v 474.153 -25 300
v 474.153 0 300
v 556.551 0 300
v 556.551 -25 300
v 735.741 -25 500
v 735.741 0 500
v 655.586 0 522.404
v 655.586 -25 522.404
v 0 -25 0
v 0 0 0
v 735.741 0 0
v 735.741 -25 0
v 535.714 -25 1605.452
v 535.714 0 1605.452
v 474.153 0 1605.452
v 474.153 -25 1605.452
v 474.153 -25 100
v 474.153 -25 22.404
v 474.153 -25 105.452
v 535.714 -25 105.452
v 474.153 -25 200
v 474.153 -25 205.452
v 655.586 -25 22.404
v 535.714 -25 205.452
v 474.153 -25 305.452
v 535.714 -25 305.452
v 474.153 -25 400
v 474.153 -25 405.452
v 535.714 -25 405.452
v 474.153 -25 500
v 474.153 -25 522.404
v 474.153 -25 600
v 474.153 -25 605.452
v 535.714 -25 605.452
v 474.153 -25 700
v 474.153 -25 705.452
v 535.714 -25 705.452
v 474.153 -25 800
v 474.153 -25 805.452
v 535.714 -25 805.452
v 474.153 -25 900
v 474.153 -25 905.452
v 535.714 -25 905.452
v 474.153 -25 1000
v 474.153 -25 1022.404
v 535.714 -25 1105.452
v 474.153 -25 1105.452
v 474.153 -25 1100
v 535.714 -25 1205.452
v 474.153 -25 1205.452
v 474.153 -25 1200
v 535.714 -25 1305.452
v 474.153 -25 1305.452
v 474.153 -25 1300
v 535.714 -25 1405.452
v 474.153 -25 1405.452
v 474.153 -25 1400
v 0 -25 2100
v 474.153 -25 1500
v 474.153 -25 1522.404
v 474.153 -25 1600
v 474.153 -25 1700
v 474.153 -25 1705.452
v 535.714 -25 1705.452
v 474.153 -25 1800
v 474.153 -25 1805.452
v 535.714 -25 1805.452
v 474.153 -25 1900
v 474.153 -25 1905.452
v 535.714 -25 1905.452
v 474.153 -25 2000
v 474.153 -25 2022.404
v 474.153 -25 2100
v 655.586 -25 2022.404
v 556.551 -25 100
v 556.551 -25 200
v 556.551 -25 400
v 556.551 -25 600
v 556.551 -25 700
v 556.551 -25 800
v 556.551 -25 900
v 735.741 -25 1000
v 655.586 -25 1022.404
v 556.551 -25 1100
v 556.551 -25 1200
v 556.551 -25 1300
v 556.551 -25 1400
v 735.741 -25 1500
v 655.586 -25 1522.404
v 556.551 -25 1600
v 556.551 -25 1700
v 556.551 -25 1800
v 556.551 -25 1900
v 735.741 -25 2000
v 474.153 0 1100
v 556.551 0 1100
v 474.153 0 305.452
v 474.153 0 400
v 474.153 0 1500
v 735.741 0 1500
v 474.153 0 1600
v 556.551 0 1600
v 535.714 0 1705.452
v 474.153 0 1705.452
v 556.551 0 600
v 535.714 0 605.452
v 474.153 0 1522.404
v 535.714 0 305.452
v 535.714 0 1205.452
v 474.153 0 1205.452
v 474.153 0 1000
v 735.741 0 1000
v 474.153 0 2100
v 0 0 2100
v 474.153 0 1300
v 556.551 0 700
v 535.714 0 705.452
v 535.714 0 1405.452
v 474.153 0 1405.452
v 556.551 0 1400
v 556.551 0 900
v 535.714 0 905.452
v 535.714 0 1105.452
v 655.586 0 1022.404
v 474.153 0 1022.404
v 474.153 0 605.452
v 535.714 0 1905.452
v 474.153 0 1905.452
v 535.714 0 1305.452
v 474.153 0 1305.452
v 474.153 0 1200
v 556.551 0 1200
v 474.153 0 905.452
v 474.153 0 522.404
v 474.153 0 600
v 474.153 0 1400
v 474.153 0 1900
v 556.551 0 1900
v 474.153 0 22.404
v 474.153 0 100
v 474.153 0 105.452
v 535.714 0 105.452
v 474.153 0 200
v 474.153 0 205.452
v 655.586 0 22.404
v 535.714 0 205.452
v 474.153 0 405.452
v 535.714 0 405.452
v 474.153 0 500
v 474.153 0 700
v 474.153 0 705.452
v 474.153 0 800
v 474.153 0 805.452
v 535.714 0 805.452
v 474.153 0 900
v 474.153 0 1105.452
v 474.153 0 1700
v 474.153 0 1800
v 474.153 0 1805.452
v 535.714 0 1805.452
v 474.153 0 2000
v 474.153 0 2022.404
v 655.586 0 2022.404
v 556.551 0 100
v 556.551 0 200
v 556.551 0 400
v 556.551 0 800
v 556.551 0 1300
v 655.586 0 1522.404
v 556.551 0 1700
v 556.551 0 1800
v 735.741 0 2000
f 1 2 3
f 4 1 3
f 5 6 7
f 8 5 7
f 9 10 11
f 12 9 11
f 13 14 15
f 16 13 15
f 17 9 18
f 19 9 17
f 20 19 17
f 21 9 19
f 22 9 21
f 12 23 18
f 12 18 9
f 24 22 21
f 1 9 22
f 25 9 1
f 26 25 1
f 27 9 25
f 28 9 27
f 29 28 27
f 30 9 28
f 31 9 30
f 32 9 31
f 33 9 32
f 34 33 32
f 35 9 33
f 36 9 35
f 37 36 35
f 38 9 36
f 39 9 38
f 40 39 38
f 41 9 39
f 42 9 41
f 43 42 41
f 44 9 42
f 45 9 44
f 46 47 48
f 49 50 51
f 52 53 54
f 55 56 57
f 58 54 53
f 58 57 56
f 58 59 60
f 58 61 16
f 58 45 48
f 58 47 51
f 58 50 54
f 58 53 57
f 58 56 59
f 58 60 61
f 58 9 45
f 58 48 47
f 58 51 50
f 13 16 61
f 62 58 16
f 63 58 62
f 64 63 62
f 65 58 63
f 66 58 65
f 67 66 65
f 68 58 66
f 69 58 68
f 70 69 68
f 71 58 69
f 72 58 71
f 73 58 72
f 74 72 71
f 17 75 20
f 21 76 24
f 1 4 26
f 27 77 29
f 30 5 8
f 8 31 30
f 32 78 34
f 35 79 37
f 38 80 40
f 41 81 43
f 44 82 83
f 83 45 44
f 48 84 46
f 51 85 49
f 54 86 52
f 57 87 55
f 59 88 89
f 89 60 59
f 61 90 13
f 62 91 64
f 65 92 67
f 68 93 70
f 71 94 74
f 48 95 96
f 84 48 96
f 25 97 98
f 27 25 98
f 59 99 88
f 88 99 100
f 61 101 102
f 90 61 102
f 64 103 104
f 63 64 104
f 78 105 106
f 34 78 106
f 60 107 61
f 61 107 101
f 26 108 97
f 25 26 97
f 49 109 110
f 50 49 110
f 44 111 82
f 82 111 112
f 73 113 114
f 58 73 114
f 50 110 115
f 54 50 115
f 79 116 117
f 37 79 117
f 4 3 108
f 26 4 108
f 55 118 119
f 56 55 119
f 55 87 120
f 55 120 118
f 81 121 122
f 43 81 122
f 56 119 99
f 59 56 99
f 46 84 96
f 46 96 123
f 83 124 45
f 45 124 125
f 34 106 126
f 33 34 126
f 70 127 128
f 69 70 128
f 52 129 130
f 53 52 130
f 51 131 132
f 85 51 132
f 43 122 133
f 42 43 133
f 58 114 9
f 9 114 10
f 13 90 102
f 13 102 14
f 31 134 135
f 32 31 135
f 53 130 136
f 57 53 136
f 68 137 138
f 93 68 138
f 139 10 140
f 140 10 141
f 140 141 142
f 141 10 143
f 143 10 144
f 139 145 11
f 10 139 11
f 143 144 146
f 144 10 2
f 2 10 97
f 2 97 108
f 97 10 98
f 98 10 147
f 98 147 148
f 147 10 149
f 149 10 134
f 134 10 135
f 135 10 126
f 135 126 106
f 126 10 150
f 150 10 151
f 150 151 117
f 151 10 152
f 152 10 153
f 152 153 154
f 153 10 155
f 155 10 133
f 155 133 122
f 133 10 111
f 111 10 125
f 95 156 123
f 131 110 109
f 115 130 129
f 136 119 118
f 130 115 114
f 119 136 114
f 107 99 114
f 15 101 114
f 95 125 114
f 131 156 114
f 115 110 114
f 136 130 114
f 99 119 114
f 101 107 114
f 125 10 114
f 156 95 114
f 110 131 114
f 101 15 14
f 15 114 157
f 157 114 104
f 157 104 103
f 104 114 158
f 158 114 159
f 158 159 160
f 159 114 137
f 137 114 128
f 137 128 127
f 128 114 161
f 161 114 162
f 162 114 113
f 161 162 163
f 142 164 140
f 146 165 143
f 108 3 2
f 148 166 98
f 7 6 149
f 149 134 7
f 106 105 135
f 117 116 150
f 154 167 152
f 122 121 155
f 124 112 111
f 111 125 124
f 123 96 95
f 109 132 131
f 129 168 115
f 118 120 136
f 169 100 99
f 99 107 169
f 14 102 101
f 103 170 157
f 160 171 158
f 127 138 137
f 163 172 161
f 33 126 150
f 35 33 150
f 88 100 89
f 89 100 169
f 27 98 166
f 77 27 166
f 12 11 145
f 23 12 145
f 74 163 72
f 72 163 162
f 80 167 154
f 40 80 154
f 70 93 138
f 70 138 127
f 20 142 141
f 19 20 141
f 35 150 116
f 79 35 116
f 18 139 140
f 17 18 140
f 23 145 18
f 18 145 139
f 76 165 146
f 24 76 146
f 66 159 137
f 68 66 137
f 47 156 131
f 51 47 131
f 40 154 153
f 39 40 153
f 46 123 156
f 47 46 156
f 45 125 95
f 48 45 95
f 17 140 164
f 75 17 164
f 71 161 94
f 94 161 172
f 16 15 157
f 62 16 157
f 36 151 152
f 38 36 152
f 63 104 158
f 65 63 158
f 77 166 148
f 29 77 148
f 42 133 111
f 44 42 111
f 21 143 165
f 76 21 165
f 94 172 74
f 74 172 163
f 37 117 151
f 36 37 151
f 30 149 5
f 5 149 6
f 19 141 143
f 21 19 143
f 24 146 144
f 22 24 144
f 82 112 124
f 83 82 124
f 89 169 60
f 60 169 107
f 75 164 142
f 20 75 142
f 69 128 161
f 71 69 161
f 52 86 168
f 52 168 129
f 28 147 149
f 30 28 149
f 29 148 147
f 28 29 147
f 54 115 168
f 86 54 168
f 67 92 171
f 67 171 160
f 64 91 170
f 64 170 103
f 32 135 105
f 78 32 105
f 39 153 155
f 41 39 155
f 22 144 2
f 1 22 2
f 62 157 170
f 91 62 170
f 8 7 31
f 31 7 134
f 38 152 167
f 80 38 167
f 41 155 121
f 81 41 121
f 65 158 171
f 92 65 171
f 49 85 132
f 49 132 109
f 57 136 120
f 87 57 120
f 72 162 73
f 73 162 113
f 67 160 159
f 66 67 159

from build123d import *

# Parameters (mm, degrees)
F1_DEPTH = 25


with BuildPart() as f1:
    # F0 (on Front) → F1 (new body)
    with BuildSketch(Plane.XZ):
        Polygon((0, 2100), (0, 0), (474.152878, 0), (474.152878, 5.451718), (474.152878, 22.404142), (474.152878, 100), (474.152878, 105.451718), (474.152878, 200), (474.152878, 205.451718), (474.152878, 300), (474.152878, 305.451718), (474.152878, 400), (474.152878, 405.451718), (474.152878, 500), (474.152878, 505.451718), (474.152878, 522.404142), (474.152878, 600), (474.152878, 605.451718), (474.152878, 700), (474.152878, 705.451718), (474.152878, 800), (474.152878, 805.451718), (474.152878, 900), (474.152878, 905.451718), (474.152878, 1000), (474.152878, 1005.451718), (474.152878, 1022.404142), (474.152878, 1100), (474.152878, 1105.451718), (474.152878, 1200), (474.152878, 1205.451718), (474.152878, 1300), (474.152878, 1305.451718), (474.152878, 1400), (474.152878, 1405.451718), (474.152878, 1500), (474.152878, 1505.451718), (474.152878, 1522.404142), (474.152878, 1600), (474.152878, 1605.451718), (474.152878, 1700), (474.152878, 1705.451718), (474.152878, 1800), (474.152878, 1805.451718), (474.152878, 1900), (474.152878, 1905.451718), (474.152878, 2000), (474.152878, 2022.404142), (474.152878, 2100), align=None)
        Polygon((474.152878, 5.451718), (474.152878, 0), (556.551218, 0), (535.71403, 5.451718), align=None)
        Polygon((474.152878, 22.404142), (474.152878, 5.451718), (535.71403, 5.451718), (556.551218, 0), (735.740867, 0), (655.585787, 22.404142), align=None)
        Polygon((655.585787, 2022.404142), (474.152878, 2022.404142), (474.152878, 2000), (735.740867, 2000), align=None)
        Polygon((474.152878, 105.451718), (474.152878, 100), (556.551218, 100), (535.71403, 105.451718), align=None)
        Polygon((535.71403, 1905.451718), (474.152878, 1905.451718), (474.152878, 1900), (556.551218, 1900), align=None)
        Polygon((474.152878, 205.451718), (474.152878, 200), (556.551218, 200), (535.71403, 205.451718), align=None)
        Polygon((535.71403, 1805.451718), (474.152878, 1805.451718), (474.152878, 1800), (556.551218, 1800), align=None)
        Polygon((474.152878, 305.451718), (474.152878, 300), (556.551218, 300), (535.71403, 305.451718), align=None)
        Polygon((535.71403, 1705.451718), (474.152878, 1705.451718), (474.152878, 1700), (556.551218, 1700), align=None)
        Polygon((474.152878, 405.451718), (474.152878, 400), (556.551218, 400), (535.71403, 405.451718), align=None)
        Polygon((535.71403, 1605.451718), (474.152878, 1605.451718), (474.152878, 1600), (556.551218, 1600), align=None)
        Polygon((474.152878, 505.451718), (474.152878, 500), (556.551218, 500), (535.71403, 505.451718), align=None)
        Polygon((474.152878, 522.404142), (474.152878, 505.451718), (535.71403, 505.451718), (556.551218, 500), (735.740867, 500), (655.585787, 522.404142), align=None)
        Polygon((655.585787, 1522.404142), (474.152878, 1522.404142), (474.152878, 1505.451718), (535.71403, 1505.451718), (556.551218, 1500), (735.740867, 1500), align=None)
        Polygon((535.71403, 1505.451718), (474.152878, 1505.451718), (474.152878, 1500), (556.551218, 1500), align=None)
        Polygon((474.152878, 605.451718), (474.152878, 600), (556.551218, 600), (535.71403, 605.451718), align=None)
        Polygon((535.71403, 1405.451718), (474.152878, 1405.451718), (474.152878, 1400), (556.551218, 1400), align=None)
        Polygon((474.152878, 705.451718), (474.152878, 700), (556.551218, 700), (535.71403, 705.451718), align=None)
        Polygon((535.71403, 1305.451718), (474.152878, 1305.451718), (474.152878, 1300), (556.551218, 1300), align=None)
        Polygon((474.152878, 805.451718), (474.152878, 800), (556.551218, 800), (535.71403, 805.451718), align=None)
        Polygon((535.71403, 1205.451718), (474.152878, 1205.451718), (474.152878, 1200), (556.551218, 1200), align=None)
        Polygon((474.152878, 905.451718), (474.152878, 900), (556.551218, 900), (535.71403, 905.451718), align=None)
        Polygon((535.71403, 1105.451718), (474.152878, 1105.451718), (474.152878, 1100), (556.551218, 1100), align=None)
        Polygon((474.152878, 1005.451718), (474.152878, 1000), (556.551218, 1000), (535.71403, 1005.451718), align=None)
        Polygon((474.152878, 1022.404142), (474.152878, 1005.451718), (535.71403, 1005.451718), (556.551218, 1000), (735.740867, 1000), (655.585787, 1022.404142), align=None)
    extrude(amount=F1_DEPTH)


solid = f1.part
